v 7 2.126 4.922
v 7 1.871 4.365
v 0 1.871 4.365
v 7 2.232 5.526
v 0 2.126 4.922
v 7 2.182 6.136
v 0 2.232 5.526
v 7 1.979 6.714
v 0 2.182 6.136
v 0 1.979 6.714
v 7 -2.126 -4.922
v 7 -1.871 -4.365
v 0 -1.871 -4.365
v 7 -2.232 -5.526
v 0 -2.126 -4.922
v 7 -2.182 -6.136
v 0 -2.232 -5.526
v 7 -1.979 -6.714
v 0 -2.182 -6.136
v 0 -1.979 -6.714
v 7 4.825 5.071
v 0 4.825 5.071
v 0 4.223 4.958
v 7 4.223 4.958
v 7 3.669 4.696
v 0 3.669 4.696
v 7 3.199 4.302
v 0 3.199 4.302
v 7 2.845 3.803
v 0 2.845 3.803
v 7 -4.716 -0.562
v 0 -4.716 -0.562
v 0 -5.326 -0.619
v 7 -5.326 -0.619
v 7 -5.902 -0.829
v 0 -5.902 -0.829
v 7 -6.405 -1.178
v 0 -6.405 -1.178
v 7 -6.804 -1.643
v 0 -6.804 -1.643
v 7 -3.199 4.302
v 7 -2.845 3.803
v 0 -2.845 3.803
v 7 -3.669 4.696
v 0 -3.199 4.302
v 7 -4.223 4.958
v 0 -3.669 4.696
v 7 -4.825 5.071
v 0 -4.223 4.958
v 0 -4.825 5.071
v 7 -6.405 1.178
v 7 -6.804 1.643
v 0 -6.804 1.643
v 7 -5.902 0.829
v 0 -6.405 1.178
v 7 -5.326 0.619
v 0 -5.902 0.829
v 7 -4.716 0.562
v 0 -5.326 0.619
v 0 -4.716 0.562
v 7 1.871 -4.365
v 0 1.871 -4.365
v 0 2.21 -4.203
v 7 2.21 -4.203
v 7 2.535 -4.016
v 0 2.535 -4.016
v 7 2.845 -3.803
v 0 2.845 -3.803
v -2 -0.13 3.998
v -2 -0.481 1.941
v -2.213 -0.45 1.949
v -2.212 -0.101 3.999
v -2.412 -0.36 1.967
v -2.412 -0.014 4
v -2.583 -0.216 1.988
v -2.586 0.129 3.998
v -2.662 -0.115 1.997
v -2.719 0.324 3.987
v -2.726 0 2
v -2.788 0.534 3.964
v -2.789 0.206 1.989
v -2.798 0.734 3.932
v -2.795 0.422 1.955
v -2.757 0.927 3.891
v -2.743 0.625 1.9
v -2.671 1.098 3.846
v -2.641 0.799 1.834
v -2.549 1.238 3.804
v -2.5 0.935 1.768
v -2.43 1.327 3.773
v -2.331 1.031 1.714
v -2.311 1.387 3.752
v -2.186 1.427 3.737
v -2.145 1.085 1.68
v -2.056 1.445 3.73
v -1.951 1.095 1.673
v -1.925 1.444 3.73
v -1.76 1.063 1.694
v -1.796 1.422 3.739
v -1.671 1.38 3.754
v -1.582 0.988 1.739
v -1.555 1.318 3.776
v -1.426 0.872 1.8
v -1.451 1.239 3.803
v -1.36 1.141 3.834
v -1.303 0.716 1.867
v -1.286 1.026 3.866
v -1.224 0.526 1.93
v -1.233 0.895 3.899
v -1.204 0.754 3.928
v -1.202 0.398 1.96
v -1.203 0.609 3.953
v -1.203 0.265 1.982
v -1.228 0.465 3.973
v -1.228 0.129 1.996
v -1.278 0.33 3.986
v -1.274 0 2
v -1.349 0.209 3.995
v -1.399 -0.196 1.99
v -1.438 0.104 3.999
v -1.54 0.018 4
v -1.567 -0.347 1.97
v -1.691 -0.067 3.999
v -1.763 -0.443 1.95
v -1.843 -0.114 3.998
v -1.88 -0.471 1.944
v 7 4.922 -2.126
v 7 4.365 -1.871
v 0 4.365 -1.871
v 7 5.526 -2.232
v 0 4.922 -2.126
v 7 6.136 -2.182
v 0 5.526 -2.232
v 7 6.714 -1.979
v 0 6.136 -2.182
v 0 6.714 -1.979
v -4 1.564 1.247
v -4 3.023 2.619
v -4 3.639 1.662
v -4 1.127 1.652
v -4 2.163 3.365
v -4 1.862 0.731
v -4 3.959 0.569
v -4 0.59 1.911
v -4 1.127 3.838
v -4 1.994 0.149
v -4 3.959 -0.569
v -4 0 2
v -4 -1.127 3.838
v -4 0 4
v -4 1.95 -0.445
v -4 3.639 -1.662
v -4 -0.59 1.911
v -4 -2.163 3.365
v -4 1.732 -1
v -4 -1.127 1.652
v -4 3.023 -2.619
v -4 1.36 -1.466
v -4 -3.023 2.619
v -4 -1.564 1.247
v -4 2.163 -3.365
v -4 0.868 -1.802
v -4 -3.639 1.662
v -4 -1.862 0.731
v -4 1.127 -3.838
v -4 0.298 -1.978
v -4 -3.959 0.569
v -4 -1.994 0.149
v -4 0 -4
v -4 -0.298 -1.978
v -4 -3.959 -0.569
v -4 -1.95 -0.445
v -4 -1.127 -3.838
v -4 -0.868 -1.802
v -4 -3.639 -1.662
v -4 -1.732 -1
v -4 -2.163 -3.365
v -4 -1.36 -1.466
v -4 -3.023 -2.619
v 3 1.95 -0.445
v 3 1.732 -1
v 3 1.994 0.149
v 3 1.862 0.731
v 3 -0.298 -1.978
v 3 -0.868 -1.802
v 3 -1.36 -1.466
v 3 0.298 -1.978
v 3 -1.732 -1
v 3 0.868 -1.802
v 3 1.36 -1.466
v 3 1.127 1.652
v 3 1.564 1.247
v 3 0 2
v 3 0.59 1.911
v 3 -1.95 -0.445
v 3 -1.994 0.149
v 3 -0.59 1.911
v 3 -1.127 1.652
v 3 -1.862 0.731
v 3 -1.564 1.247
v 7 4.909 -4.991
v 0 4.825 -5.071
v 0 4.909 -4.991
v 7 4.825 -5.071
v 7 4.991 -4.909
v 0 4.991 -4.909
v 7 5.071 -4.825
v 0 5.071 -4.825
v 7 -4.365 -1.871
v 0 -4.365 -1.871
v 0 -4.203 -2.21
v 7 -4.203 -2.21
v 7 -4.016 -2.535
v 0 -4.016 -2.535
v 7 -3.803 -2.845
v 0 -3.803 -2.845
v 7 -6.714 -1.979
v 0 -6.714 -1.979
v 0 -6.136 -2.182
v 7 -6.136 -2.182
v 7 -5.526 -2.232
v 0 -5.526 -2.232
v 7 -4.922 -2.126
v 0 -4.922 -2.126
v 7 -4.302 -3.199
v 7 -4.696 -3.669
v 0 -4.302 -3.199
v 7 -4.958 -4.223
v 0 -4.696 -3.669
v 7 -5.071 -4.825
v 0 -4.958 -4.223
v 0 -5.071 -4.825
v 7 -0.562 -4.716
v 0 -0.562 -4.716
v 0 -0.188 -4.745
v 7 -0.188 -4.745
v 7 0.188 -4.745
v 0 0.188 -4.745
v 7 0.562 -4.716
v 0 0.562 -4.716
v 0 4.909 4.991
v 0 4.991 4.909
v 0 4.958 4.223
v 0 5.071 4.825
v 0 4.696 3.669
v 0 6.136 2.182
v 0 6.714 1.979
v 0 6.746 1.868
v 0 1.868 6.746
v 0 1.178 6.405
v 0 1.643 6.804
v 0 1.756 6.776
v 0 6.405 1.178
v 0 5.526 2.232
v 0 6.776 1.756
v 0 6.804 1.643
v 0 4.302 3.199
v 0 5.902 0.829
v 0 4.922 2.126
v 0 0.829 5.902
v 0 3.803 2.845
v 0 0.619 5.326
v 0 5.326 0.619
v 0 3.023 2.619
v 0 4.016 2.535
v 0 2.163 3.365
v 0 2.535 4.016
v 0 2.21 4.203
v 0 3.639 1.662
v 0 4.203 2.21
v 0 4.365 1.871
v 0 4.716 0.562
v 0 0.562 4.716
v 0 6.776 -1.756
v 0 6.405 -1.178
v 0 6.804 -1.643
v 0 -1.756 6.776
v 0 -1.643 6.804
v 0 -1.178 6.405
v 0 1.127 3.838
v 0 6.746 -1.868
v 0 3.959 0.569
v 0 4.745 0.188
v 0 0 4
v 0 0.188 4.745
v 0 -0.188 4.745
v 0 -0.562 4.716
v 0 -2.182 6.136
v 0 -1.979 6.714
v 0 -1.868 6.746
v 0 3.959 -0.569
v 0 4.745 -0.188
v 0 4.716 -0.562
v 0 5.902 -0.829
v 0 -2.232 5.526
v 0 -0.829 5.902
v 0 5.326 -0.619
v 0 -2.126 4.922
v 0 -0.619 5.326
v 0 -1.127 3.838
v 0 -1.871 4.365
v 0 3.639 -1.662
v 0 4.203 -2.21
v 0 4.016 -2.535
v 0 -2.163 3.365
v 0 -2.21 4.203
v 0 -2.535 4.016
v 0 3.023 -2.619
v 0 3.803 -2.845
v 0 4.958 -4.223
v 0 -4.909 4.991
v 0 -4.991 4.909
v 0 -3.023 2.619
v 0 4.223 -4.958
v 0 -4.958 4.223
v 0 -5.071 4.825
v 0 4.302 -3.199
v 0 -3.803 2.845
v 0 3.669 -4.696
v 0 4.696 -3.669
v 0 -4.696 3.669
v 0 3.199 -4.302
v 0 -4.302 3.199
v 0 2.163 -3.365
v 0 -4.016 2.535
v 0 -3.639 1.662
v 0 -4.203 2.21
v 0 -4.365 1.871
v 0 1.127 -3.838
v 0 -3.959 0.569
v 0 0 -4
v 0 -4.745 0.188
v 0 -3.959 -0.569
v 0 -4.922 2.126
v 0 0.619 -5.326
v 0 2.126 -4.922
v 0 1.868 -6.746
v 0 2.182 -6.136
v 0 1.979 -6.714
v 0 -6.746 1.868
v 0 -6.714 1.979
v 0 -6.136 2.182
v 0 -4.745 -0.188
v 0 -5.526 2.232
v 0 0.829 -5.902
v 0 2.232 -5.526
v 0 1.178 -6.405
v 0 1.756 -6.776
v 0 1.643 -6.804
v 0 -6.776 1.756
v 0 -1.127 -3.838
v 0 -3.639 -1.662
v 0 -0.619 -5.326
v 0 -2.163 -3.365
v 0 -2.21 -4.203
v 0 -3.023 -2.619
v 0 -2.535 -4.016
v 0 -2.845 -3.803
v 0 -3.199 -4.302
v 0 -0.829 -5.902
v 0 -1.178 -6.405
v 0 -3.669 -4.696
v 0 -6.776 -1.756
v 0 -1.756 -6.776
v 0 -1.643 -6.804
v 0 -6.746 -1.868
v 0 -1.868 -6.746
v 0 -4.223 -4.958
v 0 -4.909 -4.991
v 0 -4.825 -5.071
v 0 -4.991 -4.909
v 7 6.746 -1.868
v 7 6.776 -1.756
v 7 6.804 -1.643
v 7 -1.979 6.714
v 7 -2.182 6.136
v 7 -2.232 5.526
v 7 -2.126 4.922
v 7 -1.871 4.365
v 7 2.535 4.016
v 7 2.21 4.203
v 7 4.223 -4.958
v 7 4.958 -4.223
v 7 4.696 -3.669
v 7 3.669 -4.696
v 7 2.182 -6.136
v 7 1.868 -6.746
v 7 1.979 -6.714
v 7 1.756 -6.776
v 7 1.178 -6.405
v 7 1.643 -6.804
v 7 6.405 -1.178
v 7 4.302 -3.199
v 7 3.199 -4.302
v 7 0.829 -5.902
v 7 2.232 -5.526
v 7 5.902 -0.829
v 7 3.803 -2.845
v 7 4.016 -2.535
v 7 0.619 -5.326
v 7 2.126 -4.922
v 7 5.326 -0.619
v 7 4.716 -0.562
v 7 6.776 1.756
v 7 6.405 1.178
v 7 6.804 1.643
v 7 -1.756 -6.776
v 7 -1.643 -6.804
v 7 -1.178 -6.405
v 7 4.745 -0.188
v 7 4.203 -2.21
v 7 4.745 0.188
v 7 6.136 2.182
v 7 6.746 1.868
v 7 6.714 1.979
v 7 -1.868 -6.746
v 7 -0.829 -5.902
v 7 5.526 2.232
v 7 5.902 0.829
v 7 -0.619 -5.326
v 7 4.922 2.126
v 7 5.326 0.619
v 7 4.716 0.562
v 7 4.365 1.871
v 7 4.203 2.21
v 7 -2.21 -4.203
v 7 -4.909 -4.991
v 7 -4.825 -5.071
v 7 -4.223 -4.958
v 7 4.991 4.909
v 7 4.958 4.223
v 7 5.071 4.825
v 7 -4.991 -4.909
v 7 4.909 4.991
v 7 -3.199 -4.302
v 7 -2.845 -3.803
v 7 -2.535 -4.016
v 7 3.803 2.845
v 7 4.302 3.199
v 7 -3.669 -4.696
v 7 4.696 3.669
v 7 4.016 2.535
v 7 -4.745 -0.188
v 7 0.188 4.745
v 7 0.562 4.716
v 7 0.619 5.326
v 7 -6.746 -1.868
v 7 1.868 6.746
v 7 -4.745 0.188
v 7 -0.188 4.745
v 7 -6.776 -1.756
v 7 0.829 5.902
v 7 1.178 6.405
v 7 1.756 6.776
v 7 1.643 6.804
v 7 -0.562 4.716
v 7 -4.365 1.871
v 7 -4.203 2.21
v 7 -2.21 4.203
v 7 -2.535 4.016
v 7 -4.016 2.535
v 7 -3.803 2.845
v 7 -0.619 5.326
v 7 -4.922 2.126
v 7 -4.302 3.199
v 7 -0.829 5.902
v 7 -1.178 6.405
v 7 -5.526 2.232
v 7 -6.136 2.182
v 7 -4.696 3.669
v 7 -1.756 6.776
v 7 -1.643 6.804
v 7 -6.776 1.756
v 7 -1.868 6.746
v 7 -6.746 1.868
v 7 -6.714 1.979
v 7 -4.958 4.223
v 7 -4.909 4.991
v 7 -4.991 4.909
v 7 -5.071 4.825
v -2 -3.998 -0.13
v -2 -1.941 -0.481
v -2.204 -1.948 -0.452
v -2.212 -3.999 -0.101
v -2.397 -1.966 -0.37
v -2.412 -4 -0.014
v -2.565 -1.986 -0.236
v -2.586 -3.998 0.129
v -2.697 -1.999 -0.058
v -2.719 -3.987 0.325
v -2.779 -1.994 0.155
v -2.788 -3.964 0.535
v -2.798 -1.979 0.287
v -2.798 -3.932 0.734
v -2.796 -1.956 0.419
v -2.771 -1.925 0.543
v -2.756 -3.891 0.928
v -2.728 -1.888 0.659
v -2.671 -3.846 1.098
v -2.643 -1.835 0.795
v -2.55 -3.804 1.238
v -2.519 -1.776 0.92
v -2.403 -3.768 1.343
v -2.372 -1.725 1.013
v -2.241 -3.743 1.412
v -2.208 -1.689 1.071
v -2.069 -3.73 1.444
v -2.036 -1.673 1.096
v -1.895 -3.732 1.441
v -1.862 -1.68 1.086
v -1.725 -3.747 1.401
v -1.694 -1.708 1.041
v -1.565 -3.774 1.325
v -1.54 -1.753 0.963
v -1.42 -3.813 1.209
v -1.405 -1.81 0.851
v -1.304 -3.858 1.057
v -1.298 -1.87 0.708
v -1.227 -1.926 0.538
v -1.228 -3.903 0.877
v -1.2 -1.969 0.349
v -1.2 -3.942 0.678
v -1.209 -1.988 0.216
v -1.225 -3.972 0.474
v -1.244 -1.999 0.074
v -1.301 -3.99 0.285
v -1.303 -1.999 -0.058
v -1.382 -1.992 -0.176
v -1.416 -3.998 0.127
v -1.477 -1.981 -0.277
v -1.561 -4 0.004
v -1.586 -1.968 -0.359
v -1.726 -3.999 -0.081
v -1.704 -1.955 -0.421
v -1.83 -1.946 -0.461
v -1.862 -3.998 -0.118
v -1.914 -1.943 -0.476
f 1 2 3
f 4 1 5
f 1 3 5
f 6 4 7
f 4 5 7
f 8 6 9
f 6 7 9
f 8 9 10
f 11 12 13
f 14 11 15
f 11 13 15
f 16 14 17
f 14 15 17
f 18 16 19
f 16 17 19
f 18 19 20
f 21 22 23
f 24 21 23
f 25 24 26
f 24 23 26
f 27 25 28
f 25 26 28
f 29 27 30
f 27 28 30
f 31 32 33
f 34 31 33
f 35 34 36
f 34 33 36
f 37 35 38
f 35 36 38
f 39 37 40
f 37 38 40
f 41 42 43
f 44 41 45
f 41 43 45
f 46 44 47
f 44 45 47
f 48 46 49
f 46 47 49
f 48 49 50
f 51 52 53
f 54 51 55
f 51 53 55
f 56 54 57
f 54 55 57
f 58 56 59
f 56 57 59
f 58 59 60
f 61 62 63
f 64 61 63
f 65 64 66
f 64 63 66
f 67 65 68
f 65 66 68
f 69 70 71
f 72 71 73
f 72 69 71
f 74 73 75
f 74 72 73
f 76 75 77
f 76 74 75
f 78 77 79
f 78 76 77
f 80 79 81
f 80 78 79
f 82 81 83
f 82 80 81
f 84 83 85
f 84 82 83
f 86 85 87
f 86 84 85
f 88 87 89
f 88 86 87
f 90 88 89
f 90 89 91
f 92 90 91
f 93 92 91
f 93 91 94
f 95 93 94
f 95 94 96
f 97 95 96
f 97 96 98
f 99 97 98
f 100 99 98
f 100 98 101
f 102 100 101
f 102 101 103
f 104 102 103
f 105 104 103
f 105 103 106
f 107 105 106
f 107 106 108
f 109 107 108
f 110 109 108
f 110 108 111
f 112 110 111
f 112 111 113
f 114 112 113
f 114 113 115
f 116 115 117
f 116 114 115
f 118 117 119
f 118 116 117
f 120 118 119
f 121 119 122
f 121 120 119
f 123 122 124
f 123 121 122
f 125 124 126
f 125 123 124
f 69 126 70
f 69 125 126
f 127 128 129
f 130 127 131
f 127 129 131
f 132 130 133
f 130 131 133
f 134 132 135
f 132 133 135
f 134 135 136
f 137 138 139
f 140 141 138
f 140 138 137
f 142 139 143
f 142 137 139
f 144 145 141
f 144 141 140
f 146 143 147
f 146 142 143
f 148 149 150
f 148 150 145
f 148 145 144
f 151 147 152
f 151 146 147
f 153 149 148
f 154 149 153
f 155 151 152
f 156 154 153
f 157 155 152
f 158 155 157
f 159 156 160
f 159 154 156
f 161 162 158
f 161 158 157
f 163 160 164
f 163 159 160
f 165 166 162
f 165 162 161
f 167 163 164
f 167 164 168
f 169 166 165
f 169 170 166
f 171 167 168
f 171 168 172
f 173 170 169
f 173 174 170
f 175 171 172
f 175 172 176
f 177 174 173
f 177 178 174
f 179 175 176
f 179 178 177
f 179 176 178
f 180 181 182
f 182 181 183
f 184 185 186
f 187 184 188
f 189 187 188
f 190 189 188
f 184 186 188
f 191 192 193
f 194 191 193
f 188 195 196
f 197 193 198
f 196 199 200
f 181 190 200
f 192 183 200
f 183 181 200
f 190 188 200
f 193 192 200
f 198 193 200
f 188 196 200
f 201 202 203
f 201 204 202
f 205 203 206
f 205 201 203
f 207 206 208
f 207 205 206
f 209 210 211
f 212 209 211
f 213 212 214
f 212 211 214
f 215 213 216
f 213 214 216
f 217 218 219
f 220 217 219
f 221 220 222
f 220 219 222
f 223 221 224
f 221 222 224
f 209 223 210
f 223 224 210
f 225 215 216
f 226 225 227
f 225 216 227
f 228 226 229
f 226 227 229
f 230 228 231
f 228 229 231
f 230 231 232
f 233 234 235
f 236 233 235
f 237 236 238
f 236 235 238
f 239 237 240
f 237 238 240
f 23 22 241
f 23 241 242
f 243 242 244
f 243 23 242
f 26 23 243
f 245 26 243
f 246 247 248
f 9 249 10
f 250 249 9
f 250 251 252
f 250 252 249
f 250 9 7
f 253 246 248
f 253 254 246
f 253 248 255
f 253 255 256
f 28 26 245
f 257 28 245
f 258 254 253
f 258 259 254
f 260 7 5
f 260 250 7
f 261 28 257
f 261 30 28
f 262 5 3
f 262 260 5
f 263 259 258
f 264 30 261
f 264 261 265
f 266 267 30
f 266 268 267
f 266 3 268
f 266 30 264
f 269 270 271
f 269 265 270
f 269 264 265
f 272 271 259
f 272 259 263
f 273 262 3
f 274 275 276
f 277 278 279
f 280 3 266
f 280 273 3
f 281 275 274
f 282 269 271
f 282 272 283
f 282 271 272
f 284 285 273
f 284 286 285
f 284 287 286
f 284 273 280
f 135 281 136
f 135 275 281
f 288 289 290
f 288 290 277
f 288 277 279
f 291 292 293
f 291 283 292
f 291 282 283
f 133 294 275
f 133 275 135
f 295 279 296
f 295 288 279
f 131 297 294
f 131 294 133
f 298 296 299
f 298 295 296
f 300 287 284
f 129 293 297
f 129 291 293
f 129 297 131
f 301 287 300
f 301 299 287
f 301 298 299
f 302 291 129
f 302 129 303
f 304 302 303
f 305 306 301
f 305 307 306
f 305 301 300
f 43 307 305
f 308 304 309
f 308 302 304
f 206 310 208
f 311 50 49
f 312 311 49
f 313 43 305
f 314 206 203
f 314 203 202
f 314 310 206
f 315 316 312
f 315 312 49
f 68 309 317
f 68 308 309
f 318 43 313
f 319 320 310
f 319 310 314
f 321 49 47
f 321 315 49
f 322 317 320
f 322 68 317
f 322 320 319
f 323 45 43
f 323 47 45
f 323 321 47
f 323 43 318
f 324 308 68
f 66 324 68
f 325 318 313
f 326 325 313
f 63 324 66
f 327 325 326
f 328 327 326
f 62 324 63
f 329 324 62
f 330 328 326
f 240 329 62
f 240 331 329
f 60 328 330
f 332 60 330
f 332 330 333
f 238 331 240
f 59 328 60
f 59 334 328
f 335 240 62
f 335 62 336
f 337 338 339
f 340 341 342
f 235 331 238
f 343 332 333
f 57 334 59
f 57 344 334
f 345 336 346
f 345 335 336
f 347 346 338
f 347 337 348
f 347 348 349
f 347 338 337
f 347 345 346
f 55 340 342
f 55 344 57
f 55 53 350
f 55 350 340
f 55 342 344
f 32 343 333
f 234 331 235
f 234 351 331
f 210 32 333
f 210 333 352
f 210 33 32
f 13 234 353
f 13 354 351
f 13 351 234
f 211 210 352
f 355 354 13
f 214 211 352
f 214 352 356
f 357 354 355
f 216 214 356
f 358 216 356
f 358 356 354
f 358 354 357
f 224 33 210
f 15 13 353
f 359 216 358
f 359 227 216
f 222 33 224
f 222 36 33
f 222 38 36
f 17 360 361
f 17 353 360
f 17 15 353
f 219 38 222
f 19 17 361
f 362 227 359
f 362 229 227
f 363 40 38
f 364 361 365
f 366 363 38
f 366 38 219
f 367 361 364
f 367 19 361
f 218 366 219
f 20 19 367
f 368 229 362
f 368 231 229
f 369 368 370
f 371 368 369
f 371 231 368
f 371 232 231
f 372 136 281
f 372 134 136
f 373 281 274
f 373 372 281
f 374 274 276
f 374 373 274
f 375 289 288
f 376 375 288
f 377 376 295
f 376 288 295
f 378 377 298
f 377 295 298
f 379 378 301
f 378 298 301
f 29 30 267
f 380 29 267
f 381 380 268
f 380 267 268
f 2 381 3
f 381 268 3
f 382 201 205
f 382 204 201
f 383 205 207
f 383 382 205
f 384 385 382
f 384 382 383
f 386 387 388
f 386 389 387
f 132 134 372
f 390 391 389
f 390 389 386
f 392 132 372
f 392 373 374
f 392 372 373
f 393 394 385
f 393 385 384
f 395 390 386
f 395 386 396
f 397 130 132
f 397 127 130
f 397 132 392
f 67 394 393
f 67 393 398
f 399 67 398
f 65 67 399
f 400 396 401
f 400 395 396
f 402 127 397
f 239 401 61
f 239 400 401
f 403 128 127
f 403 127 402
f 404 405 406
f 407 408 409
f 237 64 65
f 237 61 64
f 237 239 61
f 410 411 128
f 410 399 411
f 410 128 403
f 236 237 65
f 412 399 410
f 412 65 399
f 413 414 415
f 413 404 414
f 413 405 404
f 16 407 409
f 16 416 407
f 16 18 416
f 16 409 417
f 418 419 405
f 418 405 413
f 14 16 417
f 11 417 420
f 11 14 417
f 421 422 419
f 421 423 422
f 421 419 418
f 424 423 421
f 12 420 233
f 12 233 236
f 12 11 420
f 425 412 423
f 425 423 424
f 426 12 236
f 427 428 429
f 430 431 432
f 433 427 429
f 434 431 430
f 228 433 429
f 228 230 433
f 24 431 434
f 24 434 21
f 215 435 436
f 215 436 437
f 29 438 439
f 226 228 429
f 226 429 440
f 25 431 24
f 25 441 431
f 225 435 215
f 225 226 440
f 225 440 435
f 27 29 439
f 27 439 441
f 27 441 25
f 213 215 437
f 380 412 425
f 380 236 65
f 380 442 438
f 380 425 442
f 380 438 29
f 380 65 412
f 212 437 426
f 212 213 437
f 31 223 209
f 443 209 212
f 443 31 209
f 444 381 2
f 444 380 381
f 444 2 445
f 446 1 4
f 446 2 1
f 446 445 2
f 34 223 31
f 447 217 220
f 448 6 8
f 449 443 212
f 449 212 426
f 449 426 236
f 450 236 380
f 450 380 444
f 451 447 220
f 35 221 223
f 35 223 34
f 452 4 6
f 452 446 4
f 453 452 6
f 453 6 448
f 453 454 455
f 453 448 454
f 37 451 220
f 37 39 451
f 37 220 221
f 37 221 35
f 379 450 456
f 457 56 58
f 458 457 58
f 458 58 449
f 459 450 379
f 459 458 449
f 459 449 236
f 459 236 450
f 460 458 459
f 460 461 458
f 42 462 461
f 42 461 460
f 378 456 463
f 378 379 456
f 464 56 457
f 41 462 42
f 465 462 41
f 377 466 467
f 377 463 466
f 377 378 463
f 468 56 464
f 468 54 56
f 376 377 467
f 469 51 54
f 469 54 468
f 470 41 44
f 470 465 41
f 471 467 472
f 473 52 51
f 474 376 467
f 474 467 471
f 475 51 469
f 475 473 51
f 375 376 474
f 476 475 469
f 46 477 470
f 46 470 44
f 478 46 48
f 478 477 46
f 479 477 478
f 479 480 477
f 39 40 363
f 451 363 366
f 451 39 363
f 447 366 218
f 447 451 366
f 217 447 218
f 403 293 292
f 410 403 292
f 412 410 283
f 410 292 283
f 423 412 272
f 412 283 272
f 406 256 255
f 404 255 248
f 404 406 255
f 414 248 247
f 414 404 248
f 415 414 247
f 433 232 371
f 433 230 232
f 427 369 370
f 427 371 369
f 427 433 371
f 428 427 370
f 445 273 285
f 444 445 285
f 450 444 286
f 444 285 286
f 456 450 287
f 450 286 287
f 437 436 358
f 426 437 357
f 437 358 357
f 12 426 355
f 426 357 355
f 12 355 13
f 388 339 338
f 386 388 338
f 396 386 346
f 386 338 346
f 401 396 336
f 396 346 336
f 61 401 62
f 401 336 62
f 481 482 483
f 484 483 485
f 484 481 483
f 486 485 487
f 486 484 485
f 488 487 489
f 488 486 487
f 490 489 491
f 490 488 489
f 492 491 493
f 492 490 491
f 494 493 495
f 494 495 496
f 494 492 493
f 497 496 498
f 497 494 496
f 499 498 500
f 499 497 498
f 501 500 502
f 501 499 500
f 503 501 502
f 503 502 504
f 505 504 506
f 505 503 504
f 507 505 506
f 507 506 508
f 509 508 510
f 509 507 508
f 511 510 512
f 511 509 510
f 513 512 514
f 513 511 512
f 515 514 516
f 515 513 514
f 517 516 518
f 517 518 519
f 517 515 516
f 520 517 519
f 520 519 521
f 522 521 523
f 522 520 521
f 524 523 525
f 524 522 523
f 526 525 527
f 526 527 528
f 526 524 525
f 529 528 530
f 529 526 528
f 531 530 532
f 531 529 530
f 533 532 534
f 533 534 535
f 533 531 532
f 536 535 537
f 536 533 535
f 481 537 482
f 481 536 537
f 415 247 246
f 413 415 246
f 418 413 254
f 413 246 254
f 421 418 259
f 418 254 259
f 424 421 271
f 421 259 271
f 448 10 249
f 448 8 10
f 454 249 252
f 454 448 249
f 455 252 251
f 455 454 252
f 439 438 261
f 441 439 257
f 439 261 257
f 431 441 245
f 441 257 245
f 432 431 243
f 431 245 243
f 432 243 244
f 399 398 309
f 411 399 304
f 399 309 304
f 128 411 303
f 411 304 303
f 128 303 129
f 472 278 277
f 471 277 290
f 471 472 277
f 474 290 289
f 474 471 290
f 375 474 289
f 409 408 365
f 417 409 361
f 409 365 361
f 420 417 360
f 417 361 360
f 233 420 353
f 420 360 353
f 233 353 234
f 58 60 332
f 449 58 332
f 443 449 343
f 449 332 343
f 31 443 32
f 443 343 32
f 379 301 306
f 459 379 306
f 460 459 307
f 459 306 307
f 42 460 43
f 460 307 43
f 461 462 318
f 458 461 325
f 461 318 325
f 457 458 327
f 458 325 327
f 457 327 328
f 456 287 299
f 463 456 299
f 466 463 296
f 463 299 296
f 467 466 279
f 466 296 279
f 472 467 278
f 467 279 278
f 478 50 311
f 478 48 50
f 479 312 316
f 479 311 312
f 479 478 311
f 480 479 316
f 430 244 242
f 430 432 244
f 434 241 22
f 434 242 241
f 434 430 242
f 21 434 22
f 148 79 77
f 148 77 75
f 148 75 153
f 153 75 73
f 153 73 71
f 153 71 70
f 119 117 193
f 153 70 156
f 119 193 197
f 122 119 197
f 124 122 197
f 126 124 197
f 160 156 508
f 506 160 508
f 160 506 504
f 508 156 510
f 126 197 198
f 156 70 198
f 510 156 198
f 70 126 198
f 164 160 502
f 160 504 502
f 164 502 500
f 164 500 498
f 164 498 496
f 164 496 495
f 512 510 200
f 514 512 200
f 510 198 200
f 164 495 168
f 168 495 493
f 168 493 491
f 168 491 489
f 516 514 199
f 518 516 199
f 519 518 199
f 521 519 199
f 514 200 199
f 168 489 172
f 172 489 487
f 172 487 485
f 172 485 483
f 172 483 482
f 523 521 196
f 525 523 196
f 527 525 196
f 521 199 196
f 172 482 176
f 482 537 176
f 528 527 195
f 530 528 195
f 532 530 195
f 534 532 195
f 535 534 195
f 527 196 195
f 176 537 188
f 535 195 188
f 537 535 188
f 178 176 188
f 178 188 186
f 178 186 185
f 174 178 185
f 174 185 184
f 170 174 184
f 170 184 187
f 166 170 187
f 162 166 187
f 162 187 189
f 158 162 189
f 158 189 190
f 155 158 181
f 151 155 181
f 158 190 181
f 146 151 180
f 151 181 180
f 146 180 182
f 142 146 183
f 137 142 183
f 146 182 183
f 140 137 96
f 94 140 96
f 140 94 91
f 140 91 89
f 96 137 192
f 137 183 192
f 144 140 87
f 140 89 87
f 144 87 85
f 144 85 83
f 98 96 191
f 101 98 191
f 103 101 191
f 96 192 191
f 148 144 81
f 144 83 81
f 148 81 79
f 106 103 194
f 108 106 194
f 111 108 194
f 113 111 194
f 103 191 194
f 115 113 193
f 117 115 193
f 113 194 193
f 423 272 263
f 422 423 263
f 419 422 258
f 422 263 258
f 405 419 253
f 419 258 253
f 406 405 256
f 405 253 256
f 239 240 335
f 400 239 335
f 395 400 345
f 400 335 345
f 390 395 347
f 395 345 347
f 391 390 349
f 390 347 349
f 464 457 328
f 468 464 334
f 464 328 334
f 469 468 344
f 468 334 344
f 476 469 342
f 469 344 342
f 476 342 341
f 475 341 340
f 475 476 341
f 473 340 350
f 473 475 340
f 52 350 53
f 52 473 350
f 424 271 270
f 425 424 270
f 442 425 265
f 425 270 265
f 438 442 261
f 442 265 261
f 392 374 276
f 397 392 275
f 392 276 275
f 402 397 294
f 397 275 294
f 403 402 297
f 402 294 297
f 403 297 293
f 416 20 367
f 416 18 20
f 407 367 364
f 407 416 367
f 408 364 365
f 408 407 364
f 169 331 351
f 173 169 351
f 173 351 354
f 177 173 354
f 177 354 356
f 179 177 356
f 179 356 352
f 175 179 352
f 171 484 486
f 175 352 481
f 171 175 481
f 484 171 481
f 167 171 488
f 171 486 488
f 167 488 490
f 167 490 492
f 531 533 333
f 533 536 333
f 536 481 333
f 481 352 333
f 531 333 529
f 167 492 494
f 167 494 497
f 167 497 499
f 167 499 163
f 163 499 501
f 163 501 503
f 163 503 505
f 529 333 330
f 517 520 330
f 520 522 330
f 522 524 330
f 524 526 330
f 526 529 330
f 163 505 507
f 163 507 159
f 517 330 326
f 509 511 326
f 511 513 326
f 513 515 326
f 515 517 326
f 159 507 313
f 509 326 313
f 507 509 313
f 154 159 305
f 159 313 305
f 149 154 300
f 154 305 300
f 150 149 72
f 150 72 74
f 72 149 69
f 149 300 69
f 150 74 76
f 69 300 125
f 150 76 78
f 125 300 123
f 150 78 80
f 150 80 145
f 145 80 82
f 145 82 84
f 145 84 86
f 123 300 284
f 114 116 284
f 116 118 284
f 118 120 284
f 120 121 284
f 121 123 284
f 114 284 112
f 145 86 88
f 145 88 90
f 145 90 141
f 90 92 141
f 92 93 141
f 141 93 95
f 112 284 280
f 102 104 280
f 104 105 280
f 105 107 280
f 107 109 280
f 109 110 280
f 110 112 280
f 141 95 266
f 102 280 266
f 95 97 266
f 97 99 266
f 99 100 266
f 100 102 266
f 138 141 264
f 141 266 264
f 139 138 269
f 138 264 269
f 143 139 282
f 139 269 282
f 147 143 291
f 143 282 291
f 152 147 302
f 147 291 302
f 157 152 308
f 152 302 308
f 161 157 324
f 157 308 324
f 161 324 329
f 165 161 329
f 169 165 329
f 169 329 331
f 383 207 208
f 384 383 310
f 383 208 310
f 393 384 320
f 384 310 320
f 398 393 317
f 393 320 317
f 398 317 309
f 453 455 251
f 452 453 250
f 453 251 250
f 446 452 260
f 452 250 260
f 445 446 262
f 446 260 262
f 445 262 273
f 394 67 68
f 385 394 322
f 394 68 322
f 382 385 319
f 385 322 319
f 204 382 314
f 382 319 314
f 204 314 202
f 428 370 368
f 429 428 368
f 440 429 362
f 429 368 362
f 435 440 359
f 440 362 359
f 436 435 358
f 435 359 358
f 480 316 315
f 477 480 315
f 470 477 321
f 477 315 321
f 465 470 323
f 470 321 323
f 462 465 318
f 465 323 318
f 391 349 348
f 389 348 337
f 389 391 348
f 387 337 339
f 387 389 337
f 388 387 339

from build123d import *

# Parameters (mm, degrees)
BASPROSKE_W                  = 7
BASPROSKE_H                  = 7
TOOTHCUT_DEPTH               = 13.124355653
TEETHCUTS_COUNT              = 12
TEETHCUTS_ANGLE              = 330
HUBNEAONESKE_R               = 4
HUBNEARONE_DEPTH             = 4
BORSKE_R                     = 2
BORE_DEPTH                   = 12.0000508
ESQUISSE1_R                  = 2
BOSS_EXTRU_1_DEPTH           = 4
R_P_TITION_CIRCULAIRE1_COUNT = 2
R_P_TITION_CIRCULAIRE1_ANGLE = 90


with BuildPart() as part:
    # BasProSke → Base-Revolve (revolve)
    with BuildSketch(Plane(origin=(0, 0, 0), x_dir=(1, 0, 0), z_dir=(0, 1, 0)), mode=Mode.PRIVATE) as base_revolve_sk:
        with Locations((3.5, 3.5)):
            Rectangle(BASPROSKE_W, BASPROSKE_H)
    revolve(base_revolve_sk.sketch.rotate(Axis((-10, 0, 0), (1, 0, 0)), 180), axis=Axis((-10, 0, 0), (1, 0, 0)))

    # TooCutSke → ToothCut (cut, through all)
    with BuildSketch(Plane(origin=(0, 0, 0), x_dir=(0, 0, -1), z_dir=(1, 0, 0))):
        with BuildLine():
            ThreePointArc((0.562207301, 4.715604304), (0, 4.749), (-0.562207301, 4.715604304))
            ThreePointArc((-0.562207301, 4.715604304), (-0.837528627, 5.917009812), (-1.672850686, 6.823328788))
            ThreePointArc((-1.672850686, 6.823328788), (0, 7.0254), (1.672850686, 6.823328788))
            ThreePointArc((1.672850686, 6.823328788), (0.837528627, 5.917009812), (0.562207301, 4.715604304))
        make_face()
    toothcut = extrude(amount=TOOTHCUT_DEPTH, mode=Mode.SUBTRACT)

    # TeethCuts: ToothCut ×12 about axis
    teethcuts_axis = Axis((-10, 0, 0), (1, 0, 0))
    for i in range(1, TEETHCUTS_COUNT):
        add(toothcut.rotate(teethcuts_axis, i * TEETHCUTS_ANGLE / (TEETHCUTS_COUNT - 1)), mode=Mode.SUBTRACT)

    # HubNeaOneSke → HubNearOne (add)
    with BuildSketch(Plane.ZY):
        with Locations(Location((0, 0, 0), (0, 0, 180))):
            Circle(HUBNEAONESKE_R)
    extrude(amount=HUBNEARONE_DEPTH)

    # BorSke → Bore (cut, symmetric)
    with BuildSketch(Plane(origin=(0, 0, 0), x_dir=(0, 0, -1), z_dir=(1, 0, 0))):
        with Locations(Location((0, 0, 0), (0, 0, 180))):
            Circle(BORSKE_R)
    extrude(amount=BORE_DEPTH, both=True, mode=Mode.SUBTRACT)

    # Esquisse1 → Boss.-Extru.1 (add)
    with BuildSketch(Plane(origin=(7, 0, 0), x_dir=(0, 0, -1), z_dir=(1, 0, 0))):
        with Locations(Location((0, 0, 0), (0, 0, 180))):
            Circle(ESQUISSE1_R)
    extrude(amount=-BOSS_EXTRU_1_DEPTH)

    # Esquisse5 → Trou pour taraudage pour trou taraudé M2x0.41 (revolve, cut)
    with BuildSketch(Plane(origin=(-2, -3.943103852, 0.672258885), x_dir=(0, -0.1680647213420592, -0.9857759631073463), z_dir=(1, 0, 0))):
        Polygon((0, 0), (0, 5.480688495), (0.8, 5), (0.8, 0), align=None)
    trou_pour_taraudage_pour_trou_taraud_m2 = revolve(axis=Axis((-2, -10.202781218, 1.739469866), (0, 0.9857759631073462, -0.1680647213420592)), mode=Mode.SUBTRACT)

    # Répétition circulaire1: Trou pour taraudage pour trou taraudé M2x0.41 ×2 about axis
    r_p_tition_circulaire1_axis = Axis((12.0000508, 0, 0), (-1, 0, 0))
    for i in range(1, R_P_TITION_CIRCULAIRE1_COUNT):
        add(trou_pour_taraudage_pour_trou_taraud_m2.rotate(r_p_tition_circulaire1_axis, i * R_P_TITION_CIRCULAIRE1_ANGLE / (R_P_TITION_CIRCULAIRE1_COUNT - 1)), mode=Mode.SUBTRACT)


solid = part.part
